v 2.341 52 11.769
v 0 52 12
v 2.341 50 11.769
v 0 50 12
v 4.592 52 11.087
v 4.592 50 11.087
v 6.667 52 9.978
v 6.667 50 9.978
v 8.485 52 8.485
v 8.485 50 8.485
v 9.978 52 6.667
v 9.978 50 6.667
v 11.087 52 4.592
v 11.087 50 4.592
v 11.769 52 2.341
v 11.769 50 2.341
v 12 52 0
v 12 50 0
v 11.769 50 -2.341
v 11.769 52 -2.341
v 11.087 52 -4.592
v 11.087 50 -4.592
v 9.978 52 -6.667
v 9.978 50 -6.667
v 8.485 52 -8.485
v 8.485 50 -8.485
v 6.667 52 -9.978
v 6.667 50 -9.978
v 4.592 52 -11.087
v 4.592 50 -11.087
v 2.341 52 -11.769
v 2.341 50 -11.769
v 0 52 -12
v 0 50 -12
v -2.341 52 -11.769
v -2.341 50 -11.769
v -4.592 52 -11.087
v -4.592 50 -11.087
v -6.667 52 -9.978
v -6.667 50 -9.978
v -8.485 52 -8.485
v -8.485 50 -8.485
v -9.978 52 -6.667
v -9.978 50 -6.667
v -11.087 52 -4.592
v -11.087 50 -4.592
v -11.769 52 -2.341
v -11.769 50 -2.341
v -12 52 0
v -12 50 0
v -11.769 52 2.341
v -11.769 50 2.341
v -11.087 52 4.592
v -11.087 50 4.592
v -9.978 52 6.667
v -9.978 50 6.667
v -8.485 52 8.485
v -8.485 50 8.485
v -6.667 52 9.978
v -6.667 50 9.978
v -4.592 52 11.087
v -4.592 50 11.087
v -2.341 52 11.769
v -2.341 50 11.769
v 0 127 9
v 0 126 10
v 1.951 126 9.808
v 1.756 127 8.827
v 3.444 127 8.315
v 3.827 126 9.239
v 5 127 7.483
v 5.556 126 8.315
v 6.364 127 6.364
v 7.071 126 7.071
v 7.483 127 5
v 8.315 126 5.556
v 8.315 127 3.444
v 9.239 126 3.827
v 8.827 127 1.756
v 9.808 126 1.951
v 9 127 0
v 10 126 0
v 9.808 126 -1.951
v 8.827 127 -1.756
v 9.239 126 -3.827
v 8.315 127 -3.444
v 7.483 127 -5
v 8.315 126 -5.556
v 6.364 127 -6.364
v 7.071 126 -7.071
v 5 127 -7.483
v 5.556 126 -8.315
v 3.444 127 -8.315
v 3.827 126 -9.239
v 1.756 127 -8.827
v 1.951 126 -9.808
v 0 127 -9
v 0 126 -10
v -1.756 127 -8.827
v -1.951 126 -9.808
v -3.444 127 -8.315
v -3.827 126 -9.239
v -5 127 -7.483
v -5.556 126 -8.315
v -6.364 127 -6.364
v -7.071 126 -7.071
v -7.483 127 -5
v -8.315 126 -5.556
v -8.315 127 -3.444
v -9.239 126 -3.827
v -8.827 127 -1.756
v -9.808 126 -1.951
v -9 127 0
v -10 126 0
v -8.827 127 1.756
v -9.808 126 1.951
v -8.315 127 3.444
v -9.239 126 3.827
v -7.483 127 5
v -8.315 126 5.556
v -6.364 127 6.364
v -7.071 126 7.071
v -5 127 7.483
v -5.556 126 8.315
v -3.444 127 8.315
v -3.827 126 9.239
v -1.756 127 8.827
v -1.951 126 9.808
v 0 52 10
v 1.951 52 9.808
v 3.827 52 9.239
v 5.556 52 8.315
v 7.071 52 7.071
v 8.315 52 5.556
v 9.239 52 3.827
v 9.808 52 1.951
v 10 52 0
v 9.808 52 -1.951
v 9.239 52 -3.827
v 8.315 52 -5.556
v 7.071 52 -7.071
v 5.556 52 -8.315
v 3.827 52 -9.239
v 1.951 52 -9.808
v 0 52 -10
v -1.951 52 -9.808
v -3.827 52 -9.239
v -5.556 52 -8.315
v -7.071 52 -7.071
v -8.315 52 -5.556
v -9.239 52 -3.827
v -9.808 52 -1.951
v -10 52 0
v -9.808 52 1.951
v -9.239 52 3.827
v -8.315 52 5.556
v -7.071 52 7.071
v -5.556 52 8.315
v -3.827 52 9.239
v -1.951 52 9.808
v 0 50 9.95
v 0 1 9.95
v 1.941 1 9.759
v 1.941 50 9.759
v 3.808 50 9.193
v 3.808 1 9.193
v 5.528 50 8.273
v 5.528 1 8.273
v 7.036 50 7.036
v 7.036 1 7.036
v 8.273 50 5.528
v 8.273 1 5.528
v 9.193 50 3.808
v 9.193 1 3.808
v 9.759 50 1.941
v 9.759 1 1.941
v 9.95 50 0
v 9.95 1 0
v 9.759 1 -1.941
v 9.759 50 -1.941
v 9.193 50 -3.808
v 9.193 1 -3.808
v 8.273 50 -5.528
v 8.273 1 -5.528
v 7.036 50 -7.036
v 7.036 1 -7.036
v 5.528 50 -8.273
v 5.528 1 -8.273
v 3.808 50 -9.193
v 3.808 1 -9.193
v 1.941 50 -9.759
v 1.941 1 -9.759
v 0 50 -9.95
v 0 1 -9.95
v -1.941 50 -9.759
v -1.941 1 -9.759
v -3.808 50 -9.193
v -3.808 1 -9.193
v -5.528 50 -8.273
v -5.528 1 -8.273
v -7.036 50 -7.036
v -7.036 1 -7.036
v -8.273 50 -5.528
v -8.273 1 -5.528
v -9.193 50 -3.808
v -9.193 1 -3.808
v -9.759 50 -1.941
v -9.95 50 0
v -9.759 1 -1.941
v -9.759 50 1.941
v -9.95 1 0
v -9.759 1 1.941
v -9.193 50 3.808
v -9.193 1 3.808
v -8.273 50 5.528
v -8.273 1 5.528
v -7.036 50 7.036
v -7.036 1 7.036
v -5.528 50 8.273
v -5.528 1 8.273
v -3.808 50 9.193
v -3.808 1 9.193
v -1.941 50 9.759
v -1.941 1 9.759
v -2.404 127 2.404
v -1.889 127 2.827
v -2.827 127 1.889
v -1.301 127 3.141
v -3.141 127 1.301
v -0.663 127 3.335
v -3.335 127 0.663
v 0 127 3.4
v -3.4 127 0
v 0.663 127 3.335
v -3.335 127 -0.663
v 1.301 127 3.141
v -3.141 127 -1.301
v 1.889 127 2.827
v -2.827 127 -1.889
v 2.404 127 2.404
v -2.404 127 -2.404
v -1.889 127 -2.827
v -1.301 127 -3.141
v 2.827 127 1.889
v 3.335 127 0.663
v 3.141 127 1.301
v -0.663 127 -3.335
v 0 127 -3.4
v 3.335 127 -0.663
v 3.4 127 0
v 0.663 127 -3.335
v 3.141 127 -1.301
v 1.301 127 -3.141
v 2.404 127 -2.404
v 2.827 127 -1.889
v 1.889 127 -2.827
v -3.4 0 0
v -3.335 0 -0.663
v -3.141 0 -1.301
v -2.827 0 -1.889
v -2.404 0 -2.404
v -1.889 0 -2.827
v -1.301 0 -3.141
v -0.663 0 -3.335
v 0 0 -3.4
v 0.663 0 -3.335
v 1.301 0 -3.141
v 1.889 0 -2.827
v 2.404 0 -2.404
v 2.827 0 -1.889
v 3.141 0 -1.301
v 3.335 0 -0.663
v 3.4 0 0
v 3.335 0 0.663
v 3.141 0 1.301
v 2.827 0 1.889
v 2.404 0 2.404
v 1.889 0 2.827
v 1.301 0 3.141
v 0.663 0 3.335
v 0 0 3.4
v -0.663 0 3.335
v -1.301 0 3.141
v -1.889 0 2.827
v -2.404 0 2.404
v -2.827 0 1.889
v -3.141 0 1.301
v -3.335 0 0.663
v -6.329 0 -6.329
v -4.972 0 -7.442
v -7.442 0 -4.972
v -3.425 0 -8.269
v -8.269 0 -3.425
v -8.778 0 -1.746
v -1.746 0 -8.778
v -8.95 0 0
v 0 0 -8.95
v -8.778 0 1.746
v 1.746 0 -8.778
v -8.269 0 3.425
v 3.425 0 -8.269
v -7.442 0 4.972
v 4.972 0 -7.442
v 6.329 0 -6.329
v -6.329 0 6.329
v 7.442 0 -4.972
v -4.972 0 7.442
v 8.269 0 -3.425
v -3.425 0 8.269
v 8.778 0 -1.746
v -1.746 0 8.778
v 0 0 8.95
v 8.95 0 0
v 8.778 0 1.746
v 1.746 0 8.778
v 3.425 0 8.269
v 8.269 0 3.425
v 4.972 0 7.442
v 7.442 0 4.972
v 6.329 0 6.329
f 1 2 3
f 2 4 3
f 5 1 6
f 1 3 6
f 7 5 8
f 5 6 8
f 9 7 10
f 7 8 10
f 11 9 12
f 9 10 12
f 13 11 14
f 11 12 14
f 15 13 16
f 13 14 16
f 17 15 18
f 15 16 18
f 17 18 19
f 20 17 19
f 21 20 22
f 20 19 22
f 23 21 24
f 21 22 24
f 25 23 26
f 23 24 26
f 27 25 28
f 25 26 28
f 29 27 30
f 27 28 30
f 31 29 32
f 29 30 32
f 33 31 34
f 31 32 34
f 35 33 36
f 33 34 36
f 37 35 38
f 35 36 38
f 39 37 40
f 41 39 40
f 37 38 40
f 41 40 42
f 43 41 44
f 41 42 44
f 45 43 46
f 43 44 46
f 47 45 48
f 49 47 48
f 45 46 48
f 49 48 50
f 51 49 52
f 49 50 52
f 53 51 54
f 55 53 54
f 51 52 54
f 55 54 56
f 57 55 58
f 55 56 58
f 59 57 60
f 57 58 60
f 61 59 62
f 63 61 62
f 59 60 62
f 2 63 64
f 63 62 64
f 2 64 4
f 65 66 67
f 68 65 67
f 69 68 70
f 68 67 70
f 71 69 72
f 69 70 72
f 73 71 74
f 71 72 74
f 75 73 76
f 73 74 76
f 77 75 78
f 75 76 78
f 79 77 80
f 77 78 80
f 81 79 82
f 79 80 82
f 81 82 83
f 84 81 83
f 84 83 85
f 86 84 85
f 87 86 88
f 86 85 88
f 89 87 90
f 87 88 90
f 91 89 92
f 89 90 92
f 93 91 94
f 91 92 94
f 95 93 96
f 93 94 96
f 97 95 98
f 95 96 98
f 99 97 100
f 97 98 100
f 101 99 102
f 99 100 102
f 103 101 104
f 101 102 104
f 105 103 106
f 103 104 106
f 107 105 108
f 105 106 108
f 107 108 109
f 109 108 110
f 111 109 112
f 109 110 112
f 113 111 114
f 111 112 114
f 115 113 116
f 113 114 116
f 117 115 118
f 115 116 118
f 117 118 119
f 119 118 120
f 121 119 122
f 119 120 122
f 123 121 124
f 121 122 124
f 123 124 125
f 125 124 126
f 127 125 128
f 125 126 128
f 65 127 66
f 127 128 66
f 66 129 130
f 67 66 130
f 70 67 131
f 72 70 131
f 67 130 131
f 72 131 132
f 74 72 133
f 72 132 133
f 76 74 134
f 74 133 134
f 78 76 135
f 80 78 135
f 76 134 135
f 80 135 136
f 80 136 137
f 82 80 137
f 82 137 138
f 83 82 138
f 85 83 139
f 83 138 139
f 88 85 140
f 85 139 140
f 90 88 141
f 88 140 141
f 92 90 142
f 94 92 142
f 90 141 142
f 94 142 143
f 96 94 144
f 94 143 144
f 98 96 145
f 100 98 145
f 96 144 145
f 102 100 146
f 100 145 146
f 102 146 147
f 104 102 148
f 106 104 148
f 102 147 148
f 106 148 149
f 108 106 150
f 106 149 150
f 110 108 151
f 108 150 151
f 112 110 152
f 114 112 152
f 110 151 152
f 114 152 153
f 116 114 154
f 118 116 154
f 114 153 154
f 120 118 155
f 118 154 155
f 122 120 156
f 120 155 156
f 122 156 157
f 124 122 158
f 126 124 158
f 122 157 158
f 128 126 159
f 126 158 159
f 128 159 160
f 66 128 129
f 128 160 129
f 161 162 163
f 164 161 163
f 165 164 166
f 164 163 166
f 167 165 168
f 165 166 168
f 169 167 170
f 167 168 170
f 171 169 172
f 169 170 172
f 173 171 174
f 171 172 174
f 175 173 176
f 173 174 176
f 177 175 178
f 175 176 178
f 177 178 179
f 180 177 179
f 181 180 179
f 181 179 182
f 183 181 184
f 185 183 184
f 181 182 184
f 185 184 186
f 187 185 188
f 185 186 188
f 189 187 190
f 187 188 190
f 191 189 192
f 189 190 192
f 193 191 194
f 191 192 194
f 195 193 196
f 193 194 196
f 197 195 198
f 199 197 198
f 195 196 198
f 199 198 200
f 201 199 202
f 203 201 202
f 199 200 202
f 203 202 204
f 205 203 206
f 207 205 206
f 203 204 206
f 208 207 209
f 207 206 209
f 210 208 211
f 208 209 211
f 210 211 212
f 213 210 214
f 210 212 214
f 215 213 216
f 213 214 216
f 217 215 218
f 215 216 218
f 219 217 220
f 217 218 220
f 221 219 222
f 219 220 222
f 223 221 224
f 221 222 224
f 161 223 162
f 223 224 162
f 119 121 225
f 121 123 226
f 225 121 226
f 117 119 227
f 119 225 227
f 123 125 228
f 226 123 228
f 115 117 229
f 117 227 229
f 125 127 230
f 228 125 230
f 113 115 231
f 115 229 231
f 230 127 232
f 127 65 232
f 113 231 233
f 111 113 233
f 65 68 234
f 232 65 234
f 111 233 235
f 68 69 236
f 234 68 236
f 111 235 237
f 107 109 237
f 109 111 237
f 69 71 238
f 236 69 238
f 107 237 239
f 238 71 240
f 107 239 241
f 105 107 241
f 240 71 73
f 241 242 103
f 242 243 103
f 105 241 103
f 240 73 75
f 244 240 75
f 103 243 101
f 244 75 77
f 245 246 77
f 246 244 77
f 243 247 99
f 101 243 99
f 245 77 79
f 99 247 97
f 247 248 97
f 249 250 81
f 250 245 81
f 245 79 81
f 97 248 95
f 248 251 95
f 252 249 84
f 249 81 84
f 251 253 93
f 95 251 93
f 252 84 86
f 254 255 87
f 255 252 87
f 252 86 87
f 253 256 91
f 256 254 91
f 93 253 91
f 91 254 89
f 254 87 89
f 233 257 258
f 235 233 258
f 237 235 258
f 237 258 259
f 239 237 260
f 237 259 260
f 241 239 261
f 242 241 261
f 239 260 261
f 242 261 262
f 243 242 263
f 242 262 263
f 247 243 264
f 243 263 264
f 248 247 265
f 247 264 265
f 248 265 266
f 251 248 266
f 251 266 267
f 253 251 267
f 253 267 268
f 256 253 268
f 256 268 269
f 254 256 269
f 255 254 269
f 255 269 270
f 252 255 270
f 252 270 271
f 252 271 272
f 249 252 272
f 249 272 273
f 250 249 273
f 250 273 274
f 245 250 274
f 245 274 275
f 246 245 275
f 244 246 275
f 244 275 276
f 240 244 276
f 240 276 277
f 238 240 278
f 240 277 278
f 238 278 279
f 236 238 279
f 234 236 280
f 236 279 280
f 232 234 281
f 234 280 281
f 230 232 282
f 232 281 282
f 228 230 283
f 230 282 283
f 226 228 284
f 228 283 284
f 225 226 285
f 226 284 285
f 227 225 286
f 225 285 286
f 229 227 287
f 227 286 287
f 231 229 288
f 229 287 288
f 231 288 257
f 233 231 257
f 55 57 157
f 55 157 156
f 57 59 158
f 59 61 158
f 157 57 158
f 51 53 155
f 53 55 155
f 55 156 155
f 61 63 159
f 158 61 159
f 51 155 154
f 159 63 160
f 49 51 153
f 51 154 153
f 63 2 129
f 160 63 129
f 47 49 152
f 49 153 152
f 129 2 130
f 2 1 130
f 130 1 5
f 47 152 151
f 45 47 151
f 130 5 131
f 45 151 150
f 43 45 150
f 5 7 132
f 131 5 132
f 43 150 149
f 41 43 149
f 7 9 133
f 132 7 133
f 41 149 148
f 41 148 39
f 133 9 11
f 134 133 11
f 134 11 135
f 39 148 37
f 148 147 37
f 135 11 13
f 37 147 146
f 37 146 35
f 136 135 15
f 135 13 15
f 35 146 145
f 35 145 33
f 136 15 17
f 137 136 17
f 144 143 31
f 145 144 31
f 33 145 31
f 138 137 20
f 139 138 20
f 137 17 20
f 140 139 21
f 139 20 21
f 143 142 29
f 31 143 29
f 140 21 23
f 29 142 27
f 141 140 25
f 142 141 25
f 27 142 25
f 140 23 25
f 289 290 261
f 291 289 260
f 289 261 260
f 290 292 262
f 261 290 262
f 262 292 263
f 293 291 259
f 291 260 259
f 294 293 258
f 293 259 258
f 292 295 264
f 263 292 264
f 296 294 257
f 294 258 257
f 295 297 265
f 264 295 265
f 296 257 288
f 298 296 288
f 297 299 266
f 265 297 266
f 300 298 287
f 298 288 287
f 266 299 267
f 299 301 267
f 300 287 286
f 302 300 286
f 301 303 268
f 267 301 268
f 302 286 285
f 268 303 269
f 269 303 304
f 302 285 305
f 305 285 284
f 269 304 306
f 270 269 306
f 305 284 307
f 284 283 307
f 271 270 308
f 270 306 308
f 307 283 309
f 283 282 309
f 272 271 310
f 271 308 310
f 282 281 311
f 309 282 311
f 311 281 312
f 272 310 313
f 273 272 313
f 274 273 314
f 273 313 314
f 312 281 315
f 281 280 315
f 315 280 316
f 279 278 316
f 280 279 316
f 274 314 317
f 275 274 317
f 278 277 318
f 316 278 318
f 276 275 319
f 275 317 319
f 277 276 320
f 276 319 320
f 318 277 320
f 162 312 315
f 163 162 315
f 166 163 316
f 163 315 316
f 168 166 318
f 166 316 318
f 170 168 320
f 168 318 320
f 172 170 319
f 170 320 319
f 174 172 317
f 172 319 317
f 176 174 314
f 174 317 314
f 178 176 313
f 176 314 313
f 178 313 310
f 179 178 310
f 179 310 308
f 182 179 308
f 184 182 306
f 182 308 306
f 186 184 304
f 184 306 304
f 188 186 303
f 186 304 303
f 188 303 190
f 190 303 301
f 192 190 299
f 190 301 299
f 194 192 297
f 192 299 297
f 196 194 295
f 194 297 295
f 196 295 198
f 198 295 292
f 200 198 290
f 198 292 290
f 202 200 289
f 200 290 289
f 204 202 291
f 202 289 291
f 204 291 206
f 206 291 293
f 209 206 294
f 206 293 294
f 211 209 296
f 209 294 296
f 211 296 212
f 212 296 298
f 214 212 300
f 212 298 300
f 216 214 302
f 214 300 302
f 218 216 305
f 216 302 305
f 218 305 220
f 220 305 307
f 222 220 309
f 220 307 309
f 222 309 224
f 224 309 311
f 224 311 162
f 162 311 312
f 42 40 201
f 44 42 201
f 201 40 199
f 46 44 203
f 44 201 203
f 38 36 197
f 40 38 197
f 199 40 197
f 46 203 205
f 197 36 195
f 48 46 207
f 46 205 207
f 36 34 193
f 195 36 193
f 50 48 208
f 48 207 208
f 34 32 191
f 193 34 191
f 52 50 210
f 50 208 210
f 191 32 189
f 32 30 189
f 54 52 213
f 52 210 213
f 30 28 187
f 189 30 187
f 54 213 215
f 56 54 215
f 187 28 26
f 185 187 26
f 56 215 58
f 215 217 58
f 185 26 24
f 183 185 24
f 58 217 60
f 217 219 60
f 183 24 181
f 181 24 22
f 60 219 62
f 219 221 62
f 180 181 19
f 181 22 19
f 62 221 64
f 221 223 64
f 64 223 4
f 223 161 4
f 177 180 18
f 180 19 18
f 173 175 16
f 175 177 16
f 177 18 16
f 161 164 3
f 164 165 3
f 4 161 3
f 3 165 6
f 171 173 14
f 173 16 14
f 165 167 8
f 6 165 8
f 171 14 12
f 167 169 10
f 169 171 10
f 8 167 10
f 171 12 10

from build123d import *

# Parameters (mm, degrees)
CHAMFER1_SIZE     = 1
M8_TAPPED_HOLE1_D = 6.8


with BuildPart() as part:
    # Sketch1 → Revolve1 (revolve)
    with BuildSketch(Plane(origin=(0, 0, 0), x_dir=(0, 0, -1), z_dir=(1, 0, 0))):
        Polygon((0, 0), (0, 127), (-10, 127), (-10, 52), (-12, 52), (-12, 50), (-9.95, 50), (-9.95, 0), align=None)
    revolve(axis=Axis((0, 0, 0), (0, 1, 0)))

    # Chamfer1
    chamfer1_edges = [part.edges().sort_by_distance(p)[0] for p in [
        (0, 0, -9.95),
        (0, 127, -10),
    ]]
    chamfer(chamfer1_edges, length=CHAMFER1_SIZE)

    # M8 Tapped Hole1 (through all)
    with Locations(Plane(origin=(0, 127, 0), x_dir=(1, 0, 0), z_dir=(0, 1, 0))):
        with Locations((0, 0)):
            Hole(M8_TAPPED_HOLE1_D / 2)


solid = part.part
